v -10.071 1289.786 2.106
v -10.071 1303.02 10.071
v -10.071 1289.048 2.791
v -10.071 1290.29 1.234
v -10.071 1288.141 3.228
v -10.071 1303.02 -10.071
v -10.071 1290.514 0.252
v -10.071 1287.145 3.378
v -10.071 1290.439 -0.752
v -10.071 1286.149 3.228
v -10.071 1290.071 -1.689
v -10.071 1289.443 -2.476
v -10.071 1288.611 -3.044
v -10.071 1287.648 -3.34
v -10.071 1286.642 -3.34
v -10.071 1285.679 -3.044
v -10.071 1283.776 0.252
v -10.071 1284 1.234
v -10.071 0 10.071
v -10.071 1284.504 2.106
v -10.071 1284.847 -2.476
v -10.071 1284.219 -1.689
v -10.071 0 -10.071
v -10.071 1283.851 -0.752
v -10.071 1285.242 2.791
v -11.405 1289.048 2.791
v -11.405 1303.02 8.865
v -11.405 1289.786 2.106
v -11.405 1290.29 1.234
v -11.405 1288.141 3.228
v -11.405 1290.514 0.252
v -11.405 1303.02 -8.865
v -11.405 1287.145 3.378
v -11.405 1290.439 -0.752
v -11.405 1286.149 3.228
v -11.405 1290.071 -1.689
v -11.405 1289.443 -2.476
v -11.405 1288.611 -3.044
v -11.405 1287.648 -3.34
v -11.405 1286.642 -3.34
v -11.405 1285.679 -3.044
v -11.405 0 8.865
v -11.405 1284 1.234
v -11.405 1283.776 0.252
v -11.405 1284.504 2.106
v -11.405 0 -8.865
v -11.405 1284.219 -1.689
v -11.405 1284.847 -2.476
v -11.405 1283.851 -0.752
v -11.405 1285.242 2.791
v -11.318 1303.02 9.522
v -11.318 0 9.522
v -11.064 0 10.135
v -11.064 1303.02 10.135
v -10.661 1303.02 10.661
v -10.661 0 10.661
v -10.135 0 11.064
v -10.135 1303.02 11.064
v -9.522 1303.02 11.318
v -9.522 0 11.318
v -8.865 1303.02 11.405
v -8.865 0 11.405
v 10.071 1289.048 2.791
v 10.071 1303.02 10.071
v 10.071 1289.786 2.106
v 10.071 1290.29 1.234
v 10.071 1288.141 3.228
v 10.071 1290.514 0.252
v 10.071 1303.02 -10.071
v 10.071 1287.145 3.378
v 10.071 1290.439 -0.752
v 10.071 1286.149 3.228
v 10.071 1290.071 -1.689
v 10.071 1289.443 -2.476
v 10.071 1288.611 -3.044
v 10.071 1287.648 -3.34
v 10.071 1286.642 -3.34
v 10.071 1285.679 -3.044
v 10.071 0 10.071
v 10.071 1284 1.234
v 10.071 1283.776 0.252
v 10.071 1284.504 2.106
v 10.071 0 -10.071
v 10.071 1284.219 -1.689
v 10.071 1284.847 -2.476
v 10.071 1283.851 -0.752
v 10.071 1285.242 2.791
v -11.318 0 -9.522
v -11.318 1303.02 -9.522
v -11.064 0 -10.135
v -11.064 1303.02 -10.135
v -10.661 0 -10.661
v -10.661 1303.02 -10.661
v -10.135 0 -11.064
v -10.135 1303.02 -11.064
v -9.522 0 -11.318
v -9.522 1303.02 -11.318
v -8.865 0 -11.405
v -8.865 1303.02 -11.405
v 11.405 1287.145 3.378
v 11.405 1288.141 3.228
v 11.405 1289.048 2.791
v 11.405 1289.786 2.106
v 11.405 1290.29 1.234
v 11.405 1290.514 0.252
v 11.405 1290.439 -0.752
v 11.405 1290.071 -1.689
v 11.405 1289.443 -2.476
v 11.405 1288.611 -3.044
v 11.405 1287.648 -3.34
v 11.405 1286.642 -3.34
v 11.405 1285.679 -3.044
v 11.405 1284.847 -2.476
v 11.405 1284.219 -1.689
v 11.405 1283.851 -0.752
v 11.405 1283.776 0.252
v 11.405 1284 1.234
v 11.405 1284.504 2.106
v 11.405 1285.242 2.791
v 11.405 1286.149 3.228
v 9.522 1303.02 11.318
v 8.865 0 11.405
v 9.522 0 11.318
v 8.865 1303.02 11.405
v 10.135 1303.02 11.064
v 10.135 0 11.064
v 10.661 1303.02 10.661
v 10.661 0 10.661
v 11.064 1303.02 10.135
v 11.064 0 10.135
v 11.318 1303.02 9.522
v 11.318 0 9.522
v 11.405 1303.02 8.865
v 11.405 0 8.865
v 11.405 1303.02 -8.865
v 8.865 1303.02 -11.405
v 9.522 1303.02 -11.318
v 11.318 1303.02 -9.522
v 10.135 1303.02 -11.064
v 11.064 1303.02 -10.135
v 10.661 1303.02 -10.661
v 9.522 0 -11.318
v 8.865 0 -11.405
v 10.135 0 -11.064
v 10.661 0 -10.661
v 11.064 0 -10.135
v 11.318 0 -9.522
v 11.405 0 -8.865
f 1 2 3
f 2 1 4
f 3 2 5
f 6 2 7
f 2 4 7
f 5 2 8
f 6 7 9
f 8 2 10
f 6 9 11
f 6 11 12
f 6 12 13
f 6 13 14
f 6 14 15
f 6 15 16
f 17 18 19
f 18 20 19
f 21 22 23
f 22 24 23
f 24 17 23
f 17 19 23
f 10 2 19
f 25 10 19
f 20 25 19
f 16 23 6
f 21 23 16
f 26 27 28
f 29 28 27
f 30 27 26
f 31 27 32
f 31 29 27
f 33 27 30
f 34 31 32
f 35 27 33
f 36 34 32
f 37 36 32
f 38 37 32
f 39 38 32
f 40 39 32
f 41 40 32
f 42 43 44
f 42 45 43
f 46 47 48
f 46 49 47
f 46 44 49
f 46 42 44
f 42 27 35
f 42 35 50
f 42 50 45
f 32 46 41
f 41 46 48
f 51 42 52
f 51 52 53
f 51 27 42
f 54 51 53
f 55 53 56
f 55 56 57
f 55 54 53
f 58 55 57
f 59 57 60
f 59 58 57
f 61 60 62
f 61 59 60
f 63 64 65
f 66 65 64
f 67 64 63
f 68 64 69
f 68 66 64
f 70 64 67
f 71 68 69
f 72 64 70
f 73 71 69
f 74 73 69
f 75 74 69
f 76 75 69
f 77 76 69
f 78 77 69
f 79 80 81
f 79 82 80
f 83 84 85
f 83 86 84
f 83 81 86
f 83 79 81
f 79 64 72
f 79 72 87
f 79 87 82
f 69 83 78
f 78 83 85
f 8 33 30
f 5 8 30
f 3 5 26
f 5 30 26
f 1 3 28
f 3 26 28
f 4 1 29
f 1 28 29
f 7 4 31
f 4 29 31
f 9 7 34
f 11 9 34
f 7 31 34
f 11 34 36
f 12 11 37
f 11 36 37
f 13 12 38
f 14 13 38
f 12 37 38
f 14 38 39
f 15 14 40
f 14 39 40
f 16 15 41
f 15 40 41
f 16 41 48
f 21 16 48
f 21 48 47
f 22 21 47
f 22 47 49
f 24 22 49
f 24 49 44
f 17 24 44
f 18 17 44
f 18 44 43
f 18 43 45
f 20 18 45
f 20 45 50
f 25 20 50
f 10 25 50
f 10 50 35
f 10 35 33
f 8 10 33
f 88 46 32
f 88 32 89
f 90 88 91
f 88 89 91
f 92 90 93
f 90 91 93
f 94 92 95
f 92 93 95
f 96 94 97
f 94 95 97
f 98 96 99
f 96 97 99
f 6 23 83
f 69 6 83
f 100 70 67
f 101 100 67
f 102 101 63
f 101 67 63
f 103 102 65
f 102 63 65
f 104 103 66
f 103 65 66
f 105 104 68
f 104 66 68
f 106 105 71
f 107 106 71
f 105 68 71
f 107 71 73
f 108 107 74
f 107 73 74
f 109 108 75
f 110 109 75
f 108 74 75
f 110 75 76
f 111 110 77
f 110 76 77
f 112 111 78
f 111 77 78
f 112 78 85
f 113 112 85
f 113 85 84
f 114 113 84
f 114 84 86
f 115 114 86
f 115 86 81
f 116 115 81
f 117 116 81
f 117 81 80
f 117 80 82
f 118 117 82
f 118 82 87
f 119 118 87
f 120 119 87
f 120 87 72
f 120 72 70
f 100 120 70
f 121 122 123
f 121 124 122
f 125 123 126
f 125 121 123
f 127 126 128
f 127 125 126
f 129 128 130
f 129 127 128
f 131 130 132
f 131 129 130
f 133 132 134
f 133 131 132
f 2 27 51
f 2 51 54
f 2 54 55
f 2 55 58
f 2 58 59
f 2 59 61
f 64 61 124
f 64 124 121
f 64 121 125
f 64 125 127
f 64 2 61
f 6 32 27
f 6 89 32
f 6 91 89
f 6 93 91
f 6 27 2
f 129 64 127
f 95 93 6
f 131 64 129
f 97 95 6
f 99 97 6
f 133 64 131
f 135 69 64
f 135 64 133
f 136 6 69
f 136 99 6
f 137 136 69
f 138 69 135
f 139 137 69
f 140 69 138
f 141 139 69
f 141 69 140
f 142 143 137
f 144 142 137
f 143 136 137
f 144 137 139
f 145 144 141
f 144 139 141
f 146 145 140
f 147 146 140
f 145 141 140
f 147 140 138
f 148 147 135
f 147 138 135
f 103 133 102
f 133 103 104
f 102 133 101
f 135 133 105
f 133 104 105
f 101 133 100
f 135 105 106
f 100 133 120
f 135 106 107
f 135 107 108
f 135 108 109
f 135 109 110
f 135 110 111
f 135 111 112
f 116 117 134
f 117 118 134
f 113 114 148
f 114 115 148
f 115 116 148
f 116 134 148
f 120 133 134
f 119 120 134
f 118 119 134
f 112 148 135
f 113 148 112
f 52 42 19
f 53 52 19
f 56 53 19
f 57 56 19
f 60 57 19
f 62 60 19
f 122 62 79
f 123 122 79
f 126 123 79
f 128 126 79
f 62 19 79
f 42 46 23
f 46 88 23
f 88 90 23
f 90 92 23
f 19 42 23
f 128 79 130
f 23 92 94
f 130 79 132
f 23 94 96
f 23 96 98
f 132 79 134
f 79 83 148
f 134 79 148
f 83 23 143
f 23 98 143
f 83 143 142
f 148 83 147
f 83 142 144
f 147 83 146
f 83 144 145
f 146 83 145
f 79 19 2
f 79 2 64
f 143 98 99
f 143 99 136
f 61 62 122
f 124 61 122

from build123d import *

# Parameters (mm, degrees)
SKETCH1_W                   = 22.8092
SKETCH1_H                   = 22.8092
SKETCH1_W_2                 = 20.1422
SKETCH1_H_2                 = 20.1422
BOSS_EXTRUDE1_DEPTH         = 1303.02
FILLET1_R                   = 2.54
F_1_4_0_25_DIAMETER_HOLE1_D = 6.35
F_1_4_CLEARANCE_HOLE1_D     = 6.7564


with BuildPart() as part:
    # Sketch1 → Boss-Extrude1 (new body)
    with BuildSketch(Plane(origin=(0, 0, 0), x_dir=(1, 0, 0), z_dir=(0, 1, 0))):
        Rectangle(SKETCH1_W, SKETCH1_H)
        Rectangle(SKETCH1_W_2, SKETCH1_H_2, mode=Mode.SUBTRACT)
    extrude(amount=BOSS_EXTRUDE1_DEPTH)

    # Fillet1
    fillet1_edges = [part.edges().sort_by_distance(p)[0] for p in [
        (11.4046, 651.51, 11.4046),
        (-11.4046, 651.51, 11.4046),
        (-11.4046, 651.51, -11.4046),
        (11.4046, 651.51, -11.4046),
    ]]
    fillet(fillet1_edges, radius=FILLET1_R)

    # 1/4 (0.25) Diameter Hole1 (through all)
    with Locations(Plane(origin=(0, 0, 0), x_dir=(-1, 0, 0), z_dir=(0, -1, 0))):
        with Locations((0, 0)):
            Hole(F_1_4_0_25_DIAMETER_HOLE1_D / 2)

    # 1/4 Clearance Hole1 (through all)
    with Locations(Plane(origin=(11.4046, 0, 0), x_dir=(0, 0, -1), z_dir=(1, 0, 0))):
        with Locations((0, 1287.145)):
            Hole(F_1_4_CLEARANCE_HOLE1_D / 2)


solid = part.part
